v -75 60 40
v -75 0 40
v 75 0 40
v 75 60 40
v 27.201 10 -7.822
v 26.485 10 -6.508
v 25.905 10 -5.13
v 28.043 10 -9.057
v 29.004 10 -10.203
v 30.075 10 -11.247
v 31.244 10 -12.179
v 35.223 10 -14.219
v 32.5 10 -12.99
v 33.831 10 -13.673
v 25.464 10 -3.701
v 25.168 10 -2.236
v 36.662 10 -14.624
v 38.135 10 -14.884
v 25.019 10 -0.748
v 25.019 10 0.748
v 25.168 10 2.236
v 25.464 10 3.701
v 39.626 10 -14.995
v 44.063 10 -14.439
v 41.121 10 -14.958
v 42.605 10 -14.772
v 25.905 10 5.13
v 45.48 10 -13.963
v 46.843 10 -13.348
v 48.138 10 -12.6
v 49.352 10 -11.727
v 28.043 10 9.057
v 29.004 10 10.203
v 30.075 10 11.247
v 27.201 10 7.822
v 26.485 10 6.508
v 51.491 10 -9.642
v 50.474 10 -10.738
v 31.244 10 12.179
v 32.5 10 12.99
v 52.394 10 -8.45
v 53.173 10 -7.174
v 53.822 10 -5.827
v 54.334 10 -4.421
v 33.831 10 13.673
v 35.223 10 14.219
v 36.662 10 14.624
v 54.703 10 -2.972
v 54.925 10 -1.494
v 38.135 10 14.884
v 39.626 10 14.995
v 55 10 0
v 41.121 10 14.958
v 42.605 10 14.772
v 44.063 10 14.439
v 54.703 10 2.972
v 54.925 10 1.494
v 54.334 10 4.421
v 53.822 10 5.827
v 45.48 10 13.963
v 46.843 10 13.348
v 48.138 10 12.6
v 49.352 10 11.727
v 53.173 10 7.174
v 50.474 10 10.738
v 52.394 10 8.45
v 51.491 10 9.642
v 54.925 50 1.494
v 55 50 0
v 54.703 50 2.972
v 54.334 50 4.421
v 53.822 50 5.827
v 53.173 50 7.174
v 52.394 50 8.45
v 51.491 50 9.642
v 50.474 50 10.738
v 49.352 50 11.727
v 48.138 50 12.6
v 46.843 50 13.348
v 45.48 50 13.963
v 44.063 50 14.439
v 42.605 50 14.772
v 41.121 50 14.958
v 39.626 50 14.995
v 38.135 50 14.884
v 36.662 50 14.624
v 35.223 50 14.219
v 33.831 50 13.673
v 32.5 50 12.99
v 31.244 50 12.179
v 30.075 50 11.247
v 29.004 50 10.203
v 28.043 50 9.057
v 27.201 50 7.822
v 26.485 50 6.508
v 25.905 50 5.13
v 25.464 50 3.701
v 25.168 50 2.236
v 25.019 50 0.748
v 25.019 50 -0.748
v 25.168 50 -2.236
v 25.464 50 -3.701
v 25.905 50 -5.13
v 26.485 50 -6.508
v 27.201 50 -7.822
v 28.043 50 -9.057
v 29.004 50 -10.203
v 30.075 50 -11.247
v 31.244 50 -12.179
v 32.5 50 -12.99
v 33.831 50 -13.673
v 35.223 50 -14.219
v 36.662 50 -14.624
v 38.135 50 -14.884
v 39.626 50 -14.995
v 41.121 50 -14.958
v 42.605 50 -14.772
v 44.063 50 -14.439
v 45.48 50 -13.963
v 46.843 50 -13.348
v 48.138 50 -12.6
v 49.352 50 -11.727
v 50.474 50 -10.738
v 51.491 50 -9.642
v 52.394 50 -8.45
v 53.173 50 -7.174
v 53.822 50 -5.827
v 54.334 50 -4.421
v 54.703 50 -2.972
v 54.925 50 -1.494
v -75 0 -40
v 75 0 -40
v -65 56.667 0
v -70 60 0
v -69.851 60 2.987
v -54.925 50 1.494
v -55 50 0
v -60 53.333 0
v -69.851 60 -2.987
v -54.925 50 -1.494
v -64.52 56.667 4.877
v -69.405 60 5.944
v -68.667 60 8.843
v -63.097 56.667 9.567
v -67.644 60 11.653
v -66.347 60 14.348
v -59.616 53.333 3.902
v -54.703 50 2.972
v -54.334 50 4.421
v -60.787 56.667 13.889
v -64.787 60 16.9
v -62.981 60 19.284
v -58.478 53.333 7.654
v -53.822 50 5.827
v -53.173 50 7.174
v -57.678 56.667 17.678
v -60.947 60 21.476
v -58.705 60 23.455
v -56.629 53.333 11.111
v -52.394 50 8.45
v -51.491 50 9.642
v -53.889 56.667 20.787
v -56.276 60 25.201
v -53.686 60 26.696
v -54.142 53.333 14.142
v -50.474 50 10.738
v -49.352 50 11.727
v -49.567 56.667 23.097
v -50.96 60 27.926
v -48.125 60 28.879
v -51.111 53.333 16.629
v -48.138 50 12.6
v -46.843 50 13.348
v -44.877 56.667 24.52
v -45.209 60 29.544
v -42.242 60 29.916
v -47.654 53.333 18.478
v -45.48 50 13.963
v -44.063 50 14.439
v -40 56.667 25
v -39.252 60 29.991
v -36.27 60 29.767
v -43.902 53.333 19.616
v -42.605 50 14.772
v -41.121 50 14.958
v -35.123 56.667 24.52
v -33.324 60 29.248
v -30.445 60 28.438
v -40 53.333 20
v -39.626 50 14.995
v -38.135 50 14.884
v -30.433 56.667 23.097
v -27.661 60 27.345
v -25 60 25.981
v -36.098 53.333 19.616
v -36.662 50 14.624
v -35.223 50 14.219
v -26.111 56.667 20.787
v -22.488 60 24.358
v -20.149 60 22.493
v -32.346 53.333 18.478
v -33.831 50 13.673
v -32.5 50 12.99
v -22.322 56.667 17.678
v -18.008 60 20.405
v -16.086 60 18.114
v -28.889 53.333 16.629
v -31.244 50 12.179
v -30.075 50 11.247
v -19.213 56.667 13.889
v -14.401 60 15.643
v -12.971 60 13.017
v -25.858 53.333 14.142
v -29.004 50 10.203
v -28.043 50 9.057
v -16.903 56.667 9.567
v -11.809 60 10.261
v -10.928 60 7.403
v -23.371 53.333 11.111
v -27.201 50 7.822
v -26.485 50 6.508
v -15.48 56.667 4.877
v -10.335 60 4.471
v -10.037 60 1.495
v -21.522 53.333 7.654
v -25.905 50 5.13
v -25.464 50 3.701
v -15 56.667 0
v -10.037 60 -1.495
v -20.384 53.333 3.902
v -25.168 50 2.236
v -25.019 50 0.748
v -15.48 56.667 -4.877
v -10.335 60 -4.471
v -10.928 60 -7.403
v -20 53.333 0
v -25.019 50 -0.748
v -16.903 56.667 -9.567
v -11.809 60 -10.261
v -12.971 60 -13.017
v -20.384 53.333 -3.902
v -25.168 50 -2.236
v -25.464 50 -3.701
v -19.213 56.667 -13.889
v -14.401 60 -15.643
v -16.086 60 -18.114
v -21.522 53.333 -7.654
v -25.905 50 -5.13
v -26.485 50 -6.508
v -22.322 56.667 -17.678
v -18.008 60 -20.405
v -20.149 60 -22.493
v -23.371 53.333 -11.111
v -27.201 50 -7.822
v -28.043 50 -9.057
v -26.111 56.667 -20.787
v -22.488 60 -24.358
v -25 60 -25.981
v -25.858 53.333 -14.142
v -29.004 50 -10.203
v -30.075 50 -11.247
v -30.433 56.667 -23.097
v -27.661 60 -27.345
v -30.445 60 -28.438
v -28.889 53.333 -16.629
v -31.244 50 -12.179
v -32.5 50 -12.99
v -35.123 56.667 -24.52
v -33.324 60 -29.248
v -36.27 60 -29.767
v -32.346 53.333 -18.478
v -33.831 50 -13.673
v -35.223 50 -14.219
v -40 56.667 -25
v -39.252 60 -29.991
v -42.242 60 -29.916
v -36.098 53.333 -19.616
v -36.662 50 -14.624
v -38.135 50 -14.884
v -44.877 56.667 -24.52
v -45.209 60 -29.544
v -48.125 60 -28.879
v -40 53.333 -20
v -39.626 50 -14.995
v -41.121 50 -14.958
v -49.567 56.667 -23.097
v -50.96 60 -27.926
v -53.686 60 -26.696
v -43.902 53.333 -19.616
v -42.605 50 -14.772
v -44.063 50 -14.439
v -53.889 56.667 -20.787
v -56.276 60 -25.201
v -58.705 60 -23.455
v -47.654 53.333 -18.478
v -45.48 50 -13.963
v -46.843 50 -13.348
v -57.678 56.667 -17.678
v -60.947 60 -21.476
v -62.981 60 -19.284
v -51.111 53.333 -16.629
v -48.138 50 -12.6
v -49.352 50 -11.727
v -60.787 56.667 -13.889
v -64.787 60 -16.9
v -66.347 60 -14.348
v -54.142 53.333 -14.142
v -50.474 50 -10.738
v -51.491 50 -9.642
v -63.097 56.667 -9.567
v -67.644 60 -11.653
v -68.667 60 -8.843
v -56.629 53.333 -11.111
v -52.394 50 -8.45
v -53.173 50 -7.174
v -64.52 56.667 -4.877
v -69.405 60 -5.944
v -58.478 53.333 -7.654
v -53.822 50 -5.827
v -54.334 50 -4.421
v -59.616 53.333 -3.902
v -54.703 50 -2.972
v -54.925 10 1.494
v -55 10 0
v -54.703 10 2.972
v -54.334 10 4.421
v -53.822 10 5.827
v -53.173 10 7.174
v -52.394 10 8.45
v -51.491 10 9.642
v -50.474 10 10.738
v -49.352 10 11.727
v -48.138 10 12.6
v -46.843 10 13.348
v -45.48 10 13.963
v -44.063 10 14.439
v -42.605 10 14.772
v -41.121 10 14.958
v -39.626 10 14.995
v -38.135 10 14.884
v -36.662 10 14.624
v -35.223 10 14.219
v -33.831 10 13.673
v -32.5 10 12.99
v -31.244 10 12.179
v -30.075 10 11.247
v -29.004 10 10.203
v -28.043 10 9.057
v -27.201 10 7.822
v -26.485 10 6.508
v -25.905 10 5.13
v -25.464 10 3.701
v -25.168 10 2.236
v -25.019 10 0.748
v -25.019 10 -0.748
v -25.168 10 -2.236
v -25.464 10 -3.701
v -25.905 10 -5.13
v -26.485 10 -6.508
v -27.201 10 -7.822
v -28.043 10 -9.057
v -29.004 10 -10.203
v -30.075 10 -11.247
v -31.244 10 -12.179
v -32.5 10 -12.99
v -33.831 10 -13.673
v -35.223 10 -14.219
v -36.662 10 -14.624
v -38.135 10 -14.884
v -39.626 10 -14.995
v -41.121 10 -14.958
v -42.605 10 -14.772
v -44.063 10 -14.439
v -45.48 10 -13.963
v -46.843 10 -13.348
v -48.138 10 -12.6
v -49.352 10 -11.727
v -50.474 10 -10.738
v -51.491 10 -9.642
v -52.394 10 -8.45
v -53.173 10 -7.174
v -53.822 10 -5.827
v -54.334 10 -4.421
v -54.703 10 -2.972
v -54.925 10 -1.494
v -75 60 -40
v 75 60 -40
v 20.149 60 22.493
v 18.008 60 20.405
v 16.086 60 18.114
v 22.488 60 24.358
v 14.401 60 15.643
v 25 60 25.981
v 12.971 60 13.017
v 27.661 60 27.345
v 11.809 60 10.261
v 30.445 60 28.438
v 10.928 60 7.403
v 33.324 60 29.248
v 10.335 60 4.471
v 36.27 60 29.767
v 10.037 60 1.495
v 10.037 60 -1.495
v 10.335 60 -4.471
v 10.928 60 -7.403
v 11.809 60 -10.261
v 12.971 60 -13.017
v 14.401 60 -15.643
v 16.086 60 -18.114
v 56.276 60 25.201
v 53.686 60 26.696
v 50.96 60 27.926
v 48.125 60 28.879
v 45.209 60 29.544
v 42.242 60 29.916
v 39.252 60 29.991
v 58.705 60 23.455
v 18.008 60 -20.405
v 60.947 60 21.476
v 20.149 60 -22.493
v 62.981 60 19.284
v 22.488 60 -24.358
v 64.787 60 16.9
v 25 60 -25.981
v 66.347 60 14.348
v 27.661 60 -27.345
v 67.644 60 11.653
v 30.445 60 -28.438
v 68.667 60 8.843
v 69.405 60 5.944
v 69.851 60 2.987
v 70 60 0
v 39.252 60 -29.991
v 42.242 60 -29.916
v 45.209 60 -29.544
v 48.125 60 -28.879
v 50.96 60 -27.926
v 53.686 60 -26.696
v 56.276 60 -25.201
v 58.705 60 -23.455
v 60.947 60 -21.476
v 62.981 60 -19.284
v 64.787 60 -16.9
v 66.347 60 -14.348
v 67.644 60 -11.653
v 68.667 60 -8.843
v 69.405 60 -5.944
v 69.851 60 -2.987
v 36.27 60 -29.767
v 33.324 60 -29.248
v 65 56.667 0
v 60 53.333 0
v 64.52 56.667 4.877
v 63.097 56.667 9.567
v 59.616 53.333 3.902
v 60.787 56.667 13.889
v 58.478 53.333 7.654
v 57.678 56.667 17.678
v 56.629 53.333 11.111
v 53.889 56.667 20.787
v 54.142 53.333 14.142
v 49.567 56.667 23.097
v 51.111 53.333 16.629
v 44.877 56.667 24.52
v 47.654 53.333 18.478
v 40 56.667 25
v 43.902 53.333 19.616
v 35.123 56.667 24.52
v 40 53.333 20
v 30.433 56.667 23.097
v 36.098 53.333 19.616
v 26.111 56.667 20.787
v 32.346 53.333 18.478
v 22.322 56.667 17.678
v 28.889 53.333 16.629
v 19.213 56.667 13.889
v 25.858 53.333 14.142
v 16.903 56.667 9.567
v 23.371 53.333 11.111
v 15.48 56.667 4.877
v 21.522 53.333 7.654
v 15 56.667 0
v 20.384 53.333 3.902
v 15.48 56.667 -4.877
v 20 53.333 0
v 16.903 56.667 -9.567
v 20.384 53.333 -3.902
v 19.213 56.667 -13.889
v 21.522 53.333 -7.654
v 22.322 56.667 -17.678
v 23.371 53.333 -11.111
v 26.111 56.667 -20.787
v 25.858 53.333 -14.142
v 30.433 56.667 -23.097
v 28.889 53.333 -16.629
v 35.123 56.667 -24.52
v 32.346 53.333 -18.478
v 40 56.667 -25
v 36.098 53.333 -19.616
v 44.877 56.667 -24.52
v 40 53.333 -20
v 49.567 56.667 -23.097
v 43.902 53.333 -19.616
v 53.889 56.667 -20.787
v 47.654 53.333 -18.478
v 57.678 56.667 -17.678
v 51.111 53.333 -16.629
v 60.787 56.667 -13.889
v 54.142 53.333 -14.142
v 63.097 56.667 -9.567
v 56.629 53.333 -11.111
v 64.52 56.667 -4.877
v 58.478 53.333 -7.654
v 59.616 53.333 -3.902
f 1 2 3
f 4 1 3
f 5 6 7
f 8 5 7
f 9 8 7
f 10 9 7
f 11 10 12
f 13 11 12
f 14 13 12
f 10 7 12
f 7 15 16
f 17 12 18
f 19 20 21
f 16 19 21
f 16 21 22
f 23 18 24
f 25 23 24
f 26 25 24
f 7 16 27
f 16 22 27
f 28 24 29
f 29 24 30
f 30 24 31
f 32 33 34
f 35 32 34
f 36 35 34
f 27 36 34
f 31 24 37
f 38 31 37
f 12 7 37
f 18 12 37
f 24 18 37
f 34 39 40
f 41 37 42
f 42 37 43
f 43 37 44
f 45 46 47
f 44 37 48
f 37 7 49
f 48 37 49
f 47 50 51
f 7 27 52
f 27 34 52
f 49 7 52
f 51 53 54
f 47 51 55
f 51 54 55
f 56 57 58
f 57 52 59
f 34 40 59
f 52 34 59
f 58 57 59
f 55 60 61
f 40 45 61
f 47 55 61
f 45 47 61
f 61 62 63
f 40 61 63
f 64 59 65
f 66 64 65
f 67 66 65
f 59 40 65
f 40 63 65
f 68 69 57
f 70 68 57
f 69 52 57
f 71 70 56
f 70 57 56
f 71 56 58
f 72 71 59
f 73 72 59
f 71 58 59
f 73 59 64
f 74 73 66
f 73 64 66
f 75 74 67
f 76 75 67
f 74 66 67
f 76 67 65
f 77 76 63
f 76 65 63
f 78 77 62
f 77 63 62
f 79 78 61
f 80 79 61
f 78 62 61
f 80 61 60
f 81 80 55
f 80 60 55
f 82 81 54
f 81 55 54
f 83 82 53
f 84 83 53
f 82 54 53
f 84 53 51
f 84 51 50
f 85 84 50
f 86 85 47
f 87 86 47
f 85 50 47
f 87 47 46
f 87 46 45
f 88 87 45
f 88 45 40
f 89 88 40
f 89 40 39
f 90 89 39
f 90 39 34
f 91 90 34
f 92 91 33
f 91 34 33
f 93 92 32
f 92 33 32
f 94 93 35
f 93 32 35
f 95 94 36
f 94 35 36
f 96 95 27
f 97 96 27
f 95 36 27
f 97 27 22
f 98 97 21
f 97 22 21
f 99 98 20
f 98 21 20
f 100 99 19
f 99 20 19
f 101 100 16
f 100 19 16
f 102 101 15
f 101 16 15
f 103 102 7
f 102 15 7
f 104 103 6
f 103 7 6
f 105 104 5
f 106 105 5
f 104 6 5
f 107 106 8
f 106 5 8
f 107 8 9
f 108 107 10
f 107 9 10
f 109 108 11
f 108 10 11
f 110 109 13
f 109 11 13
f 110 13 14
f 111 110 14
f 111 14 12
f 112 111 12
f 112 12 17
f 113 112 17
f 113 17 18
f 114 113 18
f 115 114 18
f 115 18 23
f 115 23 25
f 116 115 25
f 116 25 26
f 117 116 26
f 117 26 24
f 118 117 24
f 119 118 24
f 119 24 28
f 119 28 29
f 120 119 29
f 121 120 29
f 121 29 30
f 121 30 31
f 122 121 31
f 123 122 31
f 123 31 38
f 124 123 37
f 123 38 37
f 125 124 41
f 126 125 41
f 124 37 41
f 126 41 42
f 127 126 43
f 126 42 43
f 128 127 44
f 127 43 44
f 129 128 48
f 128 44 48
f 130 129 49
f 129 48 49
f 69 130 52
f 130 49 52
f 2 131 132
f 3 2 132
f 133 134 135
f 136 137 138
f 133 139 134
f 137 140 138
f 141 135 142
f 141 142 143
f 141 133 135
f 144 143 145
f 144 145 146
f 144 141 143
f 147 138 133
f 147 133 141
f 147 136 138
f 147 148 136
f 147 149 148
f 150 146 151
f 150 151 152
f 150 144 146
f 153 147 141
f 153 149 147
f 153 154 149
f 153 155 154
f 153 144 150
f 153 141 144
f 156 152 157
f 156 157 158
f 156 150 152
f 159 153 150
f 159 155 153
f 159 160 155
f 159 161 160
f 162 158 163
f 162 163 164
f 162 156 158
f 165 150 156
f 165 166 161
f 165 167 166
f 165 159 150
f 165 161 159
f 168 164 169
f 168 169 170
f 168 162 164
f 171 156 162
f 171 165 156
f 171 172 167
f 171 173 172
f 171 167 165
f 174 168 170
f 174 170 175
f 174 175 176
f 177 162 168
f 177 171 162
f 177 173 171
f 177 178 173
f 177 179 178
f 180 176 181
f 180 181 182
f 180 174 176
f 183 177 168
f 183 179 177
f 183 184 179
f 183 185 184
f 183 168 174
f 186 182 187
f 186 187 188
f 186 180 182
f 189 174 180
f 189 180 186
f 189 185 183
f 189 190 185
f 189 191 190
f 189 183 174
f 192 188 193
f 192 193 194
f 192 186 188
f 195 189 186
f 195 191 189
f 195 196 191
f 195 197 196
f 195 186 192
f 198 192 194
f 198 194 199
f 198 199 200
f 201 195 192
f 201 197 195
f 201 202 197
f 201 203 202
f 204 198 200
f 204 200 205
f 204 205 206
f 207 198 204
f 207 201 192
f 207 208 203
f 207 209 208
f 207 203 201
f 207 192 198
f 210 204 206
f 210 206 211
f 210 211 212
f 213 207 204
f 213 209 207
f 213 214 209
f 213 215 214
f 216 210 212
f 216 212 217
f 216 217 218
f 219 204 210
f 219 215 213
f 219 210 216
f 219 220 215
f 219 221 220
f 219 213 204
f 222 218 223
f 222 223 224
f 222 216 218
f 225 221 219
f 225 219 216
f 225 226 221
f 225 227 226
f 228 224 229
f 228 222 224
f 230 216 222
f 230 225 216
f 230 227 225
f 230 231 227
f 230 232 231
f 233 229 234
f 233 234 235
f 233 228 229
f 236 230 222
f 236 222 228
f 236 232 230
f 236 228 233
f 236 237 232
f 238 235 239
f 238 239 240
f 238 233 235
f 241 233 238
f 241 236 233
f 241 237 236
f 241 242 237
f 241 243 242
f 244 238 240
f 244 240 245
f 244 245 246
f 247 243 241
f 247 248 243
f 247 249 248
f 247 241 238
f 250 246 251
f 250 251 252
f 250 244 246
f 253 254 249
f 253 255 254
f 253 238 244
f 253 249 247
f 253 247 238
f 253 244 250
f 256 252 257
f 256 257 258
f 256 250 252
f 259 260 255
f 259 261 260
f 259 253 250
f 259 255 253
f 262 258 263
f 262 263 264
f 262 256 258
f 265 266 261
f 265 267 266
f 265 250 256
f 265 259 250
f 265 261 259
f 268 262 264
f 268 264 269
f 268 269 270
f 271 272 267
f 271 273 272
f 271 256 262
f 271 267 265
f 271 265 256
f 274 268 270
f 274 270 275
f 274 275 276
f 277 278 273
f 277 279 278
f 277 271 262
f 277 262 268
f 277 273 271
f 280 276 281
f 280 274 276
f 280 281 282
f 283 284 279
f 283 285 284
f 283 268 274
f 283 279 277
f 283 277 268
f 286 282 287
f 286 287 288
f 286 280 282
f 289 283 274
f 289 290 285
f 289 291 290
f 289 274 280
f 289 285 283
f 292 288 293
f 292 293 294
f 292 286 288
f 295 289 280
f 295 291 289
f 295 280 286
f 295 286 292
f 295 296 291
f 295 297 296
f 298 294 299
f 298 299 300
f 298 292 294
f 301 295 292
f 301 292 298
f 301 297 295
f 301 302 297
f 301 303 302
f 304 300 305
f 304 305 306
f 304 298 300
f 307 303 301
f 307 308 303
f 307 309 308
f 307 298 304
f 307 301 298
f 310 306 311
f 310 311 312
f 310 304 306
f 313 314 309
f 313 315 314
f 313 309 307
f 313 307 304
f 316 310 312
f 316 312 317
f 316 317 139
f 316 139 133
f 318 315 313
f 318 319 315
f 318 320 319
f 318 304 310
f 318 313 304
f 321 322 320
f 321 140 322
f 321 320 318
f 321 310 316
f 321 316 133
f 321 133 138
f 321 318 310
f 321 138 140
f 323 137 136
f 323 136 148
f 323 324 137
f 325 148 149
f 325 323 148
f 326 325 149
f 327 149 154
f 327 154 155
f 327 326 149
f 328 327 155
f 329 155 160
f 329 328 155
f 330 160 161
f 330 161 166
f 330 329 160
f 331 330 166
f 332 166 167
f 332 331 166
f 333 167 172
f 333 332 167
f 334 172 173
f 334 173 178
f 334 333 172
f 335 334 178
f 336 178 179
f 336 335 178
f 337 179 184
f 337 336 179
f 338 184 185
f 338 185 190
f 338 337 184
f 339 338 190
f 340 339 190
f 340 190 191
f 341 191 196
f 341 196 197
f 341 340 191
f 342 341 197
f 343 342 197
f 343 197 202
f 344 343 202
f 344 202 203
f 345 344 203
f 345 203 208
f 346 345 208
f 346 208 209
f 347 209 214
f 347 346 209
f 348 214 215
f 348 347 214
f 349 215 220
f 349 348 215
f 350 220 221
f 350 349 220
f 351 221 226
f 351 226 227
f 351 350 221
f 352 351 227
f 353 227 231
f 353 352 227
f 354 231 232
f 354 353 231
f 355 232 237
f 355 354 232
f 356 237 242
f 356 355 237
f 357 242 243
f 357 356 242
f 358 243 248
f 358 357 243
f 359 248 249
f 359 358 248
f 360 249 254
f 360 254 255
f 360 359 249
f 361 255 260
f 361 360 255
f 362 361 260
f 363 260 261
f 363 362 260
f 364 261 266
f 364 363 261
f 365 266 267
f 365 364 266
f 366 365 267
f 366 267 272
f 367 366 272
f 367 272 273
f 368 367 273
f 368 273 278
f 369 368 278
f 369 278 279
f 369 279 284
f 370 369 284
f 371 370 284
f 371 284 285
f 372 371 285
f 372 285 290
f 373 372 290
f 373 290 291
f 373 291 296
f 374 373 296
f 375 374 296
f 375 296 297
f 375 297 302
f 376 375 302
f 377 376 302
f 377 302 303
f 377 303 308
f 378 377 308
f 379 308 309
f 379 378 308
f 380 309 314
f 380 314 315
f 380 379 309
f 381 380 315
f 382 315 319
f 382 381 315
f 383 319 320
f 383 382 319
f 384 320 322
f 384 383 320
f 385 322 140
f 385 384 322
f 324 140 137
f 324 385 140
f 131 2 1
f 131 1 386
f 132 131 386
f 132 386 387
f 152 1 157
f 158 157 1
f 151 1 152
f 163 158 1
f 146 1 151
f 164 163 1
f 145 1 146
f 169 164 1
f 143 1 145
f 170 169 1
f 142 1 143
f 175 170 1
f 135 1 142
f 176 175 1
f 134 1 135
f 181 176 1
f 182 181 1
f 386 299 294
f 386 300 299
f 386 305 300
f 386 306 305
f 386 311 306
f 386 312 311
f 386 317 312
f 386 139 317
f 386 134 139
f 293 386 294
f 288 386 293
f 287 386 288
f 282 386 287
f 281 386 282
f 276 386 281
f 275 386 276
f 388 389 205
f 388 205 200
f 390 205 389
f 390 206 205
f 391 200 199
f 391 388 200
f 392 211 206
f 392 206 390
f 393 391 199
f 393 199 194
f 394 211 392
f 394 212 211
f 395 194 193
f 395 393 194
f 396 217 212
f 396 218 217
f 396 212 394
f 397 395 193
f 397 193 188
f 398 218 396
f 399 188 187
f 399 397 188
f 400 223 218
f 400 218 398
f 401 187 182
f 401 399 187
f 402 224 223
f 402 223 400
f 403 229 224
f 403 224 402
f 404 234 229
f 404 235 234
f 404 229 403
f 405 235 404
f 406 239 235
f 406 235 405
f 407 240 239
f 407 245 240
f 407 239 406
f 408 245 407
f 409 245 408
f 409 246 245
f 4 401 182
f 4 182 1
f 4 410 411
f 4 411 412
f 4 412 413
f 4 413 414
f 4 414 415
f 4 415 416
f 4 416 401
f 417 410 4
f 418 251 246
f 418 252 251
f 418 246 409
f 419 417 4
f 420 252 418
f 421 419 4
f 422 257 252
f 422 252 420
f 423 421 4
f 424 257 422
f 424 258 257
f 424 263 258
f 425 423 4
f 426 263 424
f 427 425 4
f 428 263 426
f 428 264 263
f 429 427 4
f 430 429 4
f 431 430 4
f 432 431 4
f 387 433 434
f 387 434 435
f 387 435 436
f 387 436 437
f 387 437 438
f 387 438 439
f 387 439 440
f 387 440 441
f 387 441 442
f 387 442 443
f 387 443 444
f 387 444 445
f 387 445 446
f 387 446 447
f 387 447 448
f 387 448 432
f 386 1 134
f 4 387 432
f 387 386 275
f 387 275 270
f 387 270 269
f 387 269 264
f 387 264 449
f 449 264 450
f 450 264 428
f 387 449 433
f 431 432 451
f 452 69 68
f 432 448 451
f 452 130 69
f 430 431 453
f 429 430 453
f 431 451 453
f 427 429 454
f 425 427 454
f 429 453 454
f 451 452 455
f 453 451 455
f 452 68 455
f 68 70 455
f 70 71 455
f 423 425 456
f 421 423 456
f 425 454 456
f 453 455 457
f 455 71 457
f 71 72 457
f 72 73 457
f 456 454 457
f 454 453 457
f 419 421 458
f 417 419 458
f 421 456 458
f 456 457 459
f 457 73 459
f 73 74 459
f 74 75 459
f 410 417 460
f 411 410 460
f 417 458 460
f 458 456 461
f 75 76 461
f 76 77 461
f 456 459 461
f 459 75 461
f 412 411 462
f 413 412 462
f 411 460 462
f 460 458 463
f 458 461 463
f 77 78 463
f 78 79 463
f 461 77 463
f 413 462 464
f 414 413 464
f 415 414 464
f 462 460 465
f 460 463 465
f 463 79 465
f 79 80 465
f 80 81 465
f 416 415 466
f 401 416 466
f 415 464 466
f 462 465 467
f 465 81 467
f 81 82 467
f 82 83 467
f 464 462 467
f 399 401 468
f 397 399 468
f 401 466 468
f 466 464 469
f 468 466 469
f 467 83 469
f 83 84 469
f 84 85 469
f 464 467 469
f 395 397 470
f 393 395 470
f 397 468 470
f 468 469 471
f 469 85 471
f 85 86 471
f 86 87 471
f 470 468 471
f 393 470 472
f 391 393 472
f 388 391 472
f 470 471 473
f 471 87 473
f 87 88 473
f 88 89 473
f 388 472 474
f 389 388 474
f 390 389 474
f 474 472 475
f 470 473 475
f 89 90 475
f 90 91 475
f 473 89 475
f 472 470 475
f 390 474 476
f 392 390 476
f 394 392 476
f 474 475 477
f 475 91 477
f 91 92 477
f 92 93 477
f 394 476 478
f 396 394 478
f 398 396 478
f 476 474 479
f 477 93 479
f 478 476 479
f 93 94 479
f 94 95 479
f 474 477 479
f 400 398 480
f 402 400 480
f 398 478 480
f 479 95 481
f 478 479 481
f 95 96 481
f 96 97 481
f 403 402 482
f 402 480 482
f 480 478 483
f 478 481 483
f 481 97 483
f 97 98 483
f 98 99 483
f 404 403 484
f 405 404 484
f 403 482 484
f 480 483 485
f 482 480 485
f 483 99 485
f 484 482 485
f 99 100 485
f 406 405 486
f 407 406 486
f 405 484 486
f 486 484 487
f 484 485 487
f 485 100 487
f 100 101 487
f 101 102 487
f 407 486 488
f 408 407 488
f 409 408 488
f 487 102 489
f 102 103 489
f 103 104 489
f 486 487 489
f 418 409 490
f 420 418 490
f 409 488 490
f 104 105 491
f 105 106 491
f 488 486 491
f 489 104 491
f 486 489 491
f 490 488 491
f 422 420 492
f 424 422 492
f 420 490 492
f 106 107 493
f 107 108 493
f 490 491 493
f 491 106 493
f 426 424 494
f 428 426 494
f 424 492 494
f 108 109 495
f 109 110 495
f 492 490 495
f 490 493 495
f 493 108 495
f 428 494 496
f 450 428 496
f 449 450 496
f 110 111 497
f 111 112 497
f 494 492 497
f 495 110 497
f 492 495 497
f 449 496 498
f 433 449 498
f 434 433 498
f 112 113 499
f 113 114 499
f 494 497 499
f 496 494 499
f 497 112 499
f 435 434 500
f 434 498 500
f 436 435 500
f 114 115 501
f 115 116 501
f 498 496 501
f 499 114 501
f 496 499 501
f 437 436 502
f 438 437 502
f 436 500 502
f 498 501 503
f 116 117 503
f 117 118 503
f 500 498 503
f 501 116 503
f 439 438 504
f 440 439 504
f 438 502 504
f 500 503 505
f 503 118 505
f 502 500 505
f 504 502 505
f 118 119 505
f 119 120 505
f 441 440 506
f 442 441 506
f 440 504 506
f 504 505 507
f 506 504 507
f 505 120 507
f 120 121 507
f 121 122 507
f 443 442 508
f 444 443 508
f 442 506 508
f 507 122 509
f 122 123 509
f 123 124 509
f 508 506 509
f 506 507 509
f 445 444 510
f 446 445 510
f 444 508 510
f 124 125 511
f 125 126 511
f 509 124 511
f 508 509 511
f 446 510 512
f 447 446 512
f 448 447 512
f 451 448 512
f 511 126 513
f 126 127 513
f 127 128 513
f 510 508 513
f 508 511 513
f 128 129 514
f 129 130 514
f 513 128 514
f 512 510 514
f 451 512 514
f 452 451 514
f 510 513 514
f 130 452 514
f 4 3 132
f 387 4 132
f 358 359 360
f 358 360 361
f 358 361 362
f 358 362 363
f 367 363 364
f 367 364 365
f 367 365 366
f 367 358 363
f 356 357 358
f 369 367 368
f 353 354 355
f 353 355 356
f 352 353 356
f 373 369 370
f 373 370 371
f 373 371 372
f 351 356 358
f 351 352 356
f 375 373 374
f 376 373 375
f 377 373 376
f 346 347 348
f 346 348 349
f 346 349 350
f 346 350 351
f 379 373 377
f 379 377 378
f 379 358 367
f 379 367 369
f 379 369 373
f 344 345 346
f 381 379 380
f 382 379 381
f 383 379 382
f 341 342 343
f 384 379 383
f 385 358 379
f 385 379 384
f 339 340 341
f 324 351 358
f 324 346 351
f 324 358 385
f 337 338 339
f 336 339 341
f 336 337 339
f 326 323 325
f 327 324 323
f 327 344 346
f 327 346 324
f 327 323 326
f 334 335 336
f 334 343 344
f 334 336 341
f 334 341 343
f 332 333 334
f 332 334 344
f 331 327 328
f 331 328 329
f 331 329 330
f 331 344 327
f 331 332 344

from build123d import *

# Parameters (mm, degrees)
SKETCH1_W           = 150
SKETCH1_H           = 80
BOSS_EXTRUDE1_DEPTH = 60


with BuildPart() as part:
    # Sketch1 → Boss-Extrude1 (new body)
    with BuildSketch(Plane(origin=(0, 0, 0), x_dir=(1, 0, 0), z_dir=(0, 1, 0))):
        Rectangle(SKETCH1_W, SKETCH1_H)
    extrude(amount=BOSS_EXTRUDE1_DEPTH)

    # Sketch2 → Cut-Revolve1 (revolve, cut)
    with BuildSketch(Plane.XY):
        Polygon((-40, 60), (-70, 60), (-55, 50), (-55, 10), (-40, 10), align=None)
    cut_revolve1 = revolve(axis=Axis((-40, 10, 0), (0, 1, 0)), mode=Mode.SUBTRACT)

    # Mirror1: Cut-Revolve1 across plane
    add(cut_revolve1.mirror(Plane(origin=(0, 0, 0), x_dir=(0, 0, 1), z_dir=(1, 0, 0))), mode=Mode.SUBTRACT)


solid = part.part
